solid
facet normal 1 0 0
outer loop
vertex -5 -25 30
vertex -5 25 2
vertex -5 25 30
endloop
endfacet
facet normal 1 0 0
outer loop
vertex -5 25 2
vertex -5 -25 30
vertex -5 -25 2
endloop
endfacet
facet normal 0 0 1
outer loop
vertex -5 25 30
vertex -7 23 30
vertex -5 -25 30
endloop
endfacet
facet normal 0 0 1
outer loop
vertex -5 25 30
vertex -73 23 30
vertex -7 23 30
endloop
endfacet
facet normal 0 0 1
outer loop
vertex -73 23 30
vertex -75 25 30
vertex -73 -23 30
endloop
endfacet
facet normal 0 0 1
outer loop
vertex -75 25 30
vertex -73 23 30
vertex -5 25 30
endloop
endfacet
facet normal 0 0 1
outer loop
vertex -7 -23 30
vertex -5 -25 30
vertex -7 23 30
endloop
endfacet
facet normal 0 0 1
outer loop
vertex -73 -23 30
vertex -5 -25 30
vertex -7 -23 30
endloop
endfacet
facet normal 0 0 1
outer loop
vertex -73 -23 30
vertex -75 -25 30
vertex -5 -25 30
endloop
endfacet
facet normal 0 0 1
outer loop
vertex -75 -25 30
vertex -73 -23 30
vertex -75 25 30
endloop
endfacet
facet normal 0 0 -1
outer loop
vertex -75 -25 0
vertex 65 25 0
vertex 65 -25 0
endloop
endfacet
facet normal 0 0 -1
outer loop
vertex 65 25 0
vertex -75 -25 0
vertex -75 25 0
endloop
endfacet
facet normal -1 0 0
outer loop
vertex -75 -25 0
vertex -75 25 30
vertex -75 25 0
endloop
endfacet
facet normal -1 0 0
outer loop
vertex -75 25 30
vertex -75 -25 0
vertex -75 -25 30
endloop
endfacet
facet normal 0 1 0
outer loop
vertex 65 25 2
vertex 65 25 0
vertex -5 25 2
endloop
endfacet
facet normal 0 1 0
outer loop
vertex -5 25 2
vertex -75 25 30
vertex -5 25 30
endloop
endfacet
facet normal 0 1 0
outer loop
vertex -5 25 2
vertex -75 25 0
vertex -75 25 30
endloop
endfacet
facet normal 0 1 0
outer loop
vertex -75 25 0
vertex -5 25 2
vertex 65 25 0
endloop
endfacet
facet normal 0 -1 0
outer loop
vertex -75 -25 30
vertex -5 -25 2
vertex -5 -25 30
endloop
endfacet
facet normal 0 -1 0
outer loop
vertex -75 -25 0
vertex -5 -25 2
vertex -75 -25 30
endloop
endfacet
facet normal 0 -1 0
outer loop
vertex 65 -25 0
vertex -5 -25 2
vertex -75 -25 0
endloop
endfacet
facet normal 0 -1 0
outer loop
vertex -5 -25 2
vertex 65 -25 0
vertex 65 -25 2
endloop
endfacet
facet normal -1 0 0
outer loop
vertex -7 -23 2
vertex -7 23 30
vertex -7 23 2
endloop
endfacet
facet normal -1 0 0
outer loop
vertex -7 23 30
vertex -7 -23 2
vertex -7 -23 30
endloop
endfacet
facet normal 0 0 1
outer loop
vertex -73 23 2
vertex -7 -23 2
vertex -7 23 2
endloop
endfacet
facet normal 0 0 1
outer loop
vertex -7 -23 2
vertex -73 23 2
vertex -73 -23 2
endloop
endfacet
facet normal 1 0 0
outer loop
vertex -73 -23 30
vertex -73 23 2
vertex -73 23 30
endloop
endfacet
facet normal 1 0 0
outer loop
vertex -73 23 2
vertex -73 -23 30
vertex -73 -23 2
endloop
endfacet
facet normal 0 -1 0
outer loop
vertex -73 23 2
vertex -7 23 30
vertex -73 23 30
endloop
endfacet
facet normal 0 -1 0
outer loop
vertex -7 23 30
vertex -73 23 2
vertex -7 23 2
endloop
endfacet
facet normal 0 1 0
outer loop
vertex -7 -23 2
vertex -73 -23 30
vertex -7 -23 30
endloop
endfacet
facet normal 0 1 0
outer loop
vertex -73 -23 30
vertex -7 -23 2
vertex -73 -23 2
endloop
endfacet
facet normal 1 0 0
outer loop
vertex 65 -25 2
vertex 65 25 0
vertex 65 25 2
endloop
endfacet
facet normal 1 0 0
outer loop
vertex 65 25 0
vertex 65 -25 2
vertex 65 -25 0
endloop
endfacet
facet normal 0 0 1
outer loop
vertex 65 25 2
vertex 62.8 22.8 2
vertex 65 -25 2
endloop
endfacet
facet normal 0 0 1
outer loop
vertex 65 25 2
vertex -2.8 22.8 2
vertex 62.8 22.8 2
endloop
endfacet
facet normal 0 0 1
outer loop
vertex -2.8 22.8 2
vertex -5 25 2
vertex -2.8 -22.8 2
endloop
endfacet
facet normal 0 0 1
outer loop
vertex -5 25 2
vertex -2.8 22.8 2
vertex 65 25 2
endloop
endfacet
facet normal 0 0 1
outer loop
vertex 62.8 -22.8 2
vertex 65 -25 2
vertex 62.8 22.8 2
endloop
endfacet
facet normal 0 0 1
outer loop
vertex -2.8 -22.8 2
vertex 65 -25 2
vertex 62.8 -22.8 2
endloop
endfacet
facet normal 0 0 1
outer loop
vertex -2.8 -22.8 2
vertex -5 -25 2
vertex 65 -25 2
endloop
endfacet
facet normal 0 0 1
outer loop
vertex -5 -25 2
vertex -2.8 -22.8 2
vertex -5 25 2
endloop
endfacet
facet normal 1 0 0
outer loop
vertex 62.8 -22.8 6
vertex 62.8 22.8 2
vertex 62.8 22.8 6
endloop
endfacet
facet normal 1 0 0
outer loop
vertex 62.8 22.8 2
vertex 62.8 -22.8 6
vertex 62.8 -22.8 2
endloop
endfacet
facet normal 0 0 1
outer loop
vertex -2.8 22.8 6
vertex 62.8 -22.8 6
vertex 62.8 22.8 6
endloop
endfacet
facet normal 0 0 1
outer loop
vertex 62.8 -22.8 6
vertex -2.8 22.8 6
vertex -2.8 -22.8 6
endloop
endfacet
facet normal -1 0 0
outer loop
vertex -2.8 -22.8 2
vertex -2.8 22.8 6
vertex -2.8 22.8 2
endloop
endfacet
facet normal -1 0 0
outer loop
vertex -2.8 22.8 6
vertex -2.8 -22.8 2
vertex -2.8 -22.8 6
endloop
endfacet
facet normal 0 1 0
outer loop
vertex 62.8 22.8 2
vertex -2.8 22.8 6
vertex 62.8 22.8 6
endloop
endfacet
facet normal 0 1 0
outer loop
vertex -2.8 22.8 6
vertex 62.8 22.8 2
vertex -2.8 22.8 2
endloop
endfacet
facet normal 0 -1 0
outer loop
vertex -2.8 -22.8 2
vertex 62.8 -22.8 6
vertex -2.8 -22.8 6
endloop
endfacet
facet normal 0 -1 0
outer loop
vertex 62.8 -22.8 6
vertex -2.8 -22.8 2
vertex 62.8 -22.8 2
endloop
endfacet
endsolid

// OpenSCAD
// Built by bench/smallmodels/features/compiler.py from a list of features.
$fn = 64;
difference() {
  union() {
    translate([-40, 0, 0]) translate([-35, -25, 0]) cube([70, 50, 30]);
  }
  translate([-73, -23, 2]) cube([66, 46, 29]);  // shell, wall 2, open top
}
union() {
    translate([30, 0, 0]) translate([-35, -25, 0]) cube([70, 50, 2]);
    translate([30, 0, 2]) translate([-32.8, -22.8, 0]) cube([65.6, 45.6, 4]);
  }
